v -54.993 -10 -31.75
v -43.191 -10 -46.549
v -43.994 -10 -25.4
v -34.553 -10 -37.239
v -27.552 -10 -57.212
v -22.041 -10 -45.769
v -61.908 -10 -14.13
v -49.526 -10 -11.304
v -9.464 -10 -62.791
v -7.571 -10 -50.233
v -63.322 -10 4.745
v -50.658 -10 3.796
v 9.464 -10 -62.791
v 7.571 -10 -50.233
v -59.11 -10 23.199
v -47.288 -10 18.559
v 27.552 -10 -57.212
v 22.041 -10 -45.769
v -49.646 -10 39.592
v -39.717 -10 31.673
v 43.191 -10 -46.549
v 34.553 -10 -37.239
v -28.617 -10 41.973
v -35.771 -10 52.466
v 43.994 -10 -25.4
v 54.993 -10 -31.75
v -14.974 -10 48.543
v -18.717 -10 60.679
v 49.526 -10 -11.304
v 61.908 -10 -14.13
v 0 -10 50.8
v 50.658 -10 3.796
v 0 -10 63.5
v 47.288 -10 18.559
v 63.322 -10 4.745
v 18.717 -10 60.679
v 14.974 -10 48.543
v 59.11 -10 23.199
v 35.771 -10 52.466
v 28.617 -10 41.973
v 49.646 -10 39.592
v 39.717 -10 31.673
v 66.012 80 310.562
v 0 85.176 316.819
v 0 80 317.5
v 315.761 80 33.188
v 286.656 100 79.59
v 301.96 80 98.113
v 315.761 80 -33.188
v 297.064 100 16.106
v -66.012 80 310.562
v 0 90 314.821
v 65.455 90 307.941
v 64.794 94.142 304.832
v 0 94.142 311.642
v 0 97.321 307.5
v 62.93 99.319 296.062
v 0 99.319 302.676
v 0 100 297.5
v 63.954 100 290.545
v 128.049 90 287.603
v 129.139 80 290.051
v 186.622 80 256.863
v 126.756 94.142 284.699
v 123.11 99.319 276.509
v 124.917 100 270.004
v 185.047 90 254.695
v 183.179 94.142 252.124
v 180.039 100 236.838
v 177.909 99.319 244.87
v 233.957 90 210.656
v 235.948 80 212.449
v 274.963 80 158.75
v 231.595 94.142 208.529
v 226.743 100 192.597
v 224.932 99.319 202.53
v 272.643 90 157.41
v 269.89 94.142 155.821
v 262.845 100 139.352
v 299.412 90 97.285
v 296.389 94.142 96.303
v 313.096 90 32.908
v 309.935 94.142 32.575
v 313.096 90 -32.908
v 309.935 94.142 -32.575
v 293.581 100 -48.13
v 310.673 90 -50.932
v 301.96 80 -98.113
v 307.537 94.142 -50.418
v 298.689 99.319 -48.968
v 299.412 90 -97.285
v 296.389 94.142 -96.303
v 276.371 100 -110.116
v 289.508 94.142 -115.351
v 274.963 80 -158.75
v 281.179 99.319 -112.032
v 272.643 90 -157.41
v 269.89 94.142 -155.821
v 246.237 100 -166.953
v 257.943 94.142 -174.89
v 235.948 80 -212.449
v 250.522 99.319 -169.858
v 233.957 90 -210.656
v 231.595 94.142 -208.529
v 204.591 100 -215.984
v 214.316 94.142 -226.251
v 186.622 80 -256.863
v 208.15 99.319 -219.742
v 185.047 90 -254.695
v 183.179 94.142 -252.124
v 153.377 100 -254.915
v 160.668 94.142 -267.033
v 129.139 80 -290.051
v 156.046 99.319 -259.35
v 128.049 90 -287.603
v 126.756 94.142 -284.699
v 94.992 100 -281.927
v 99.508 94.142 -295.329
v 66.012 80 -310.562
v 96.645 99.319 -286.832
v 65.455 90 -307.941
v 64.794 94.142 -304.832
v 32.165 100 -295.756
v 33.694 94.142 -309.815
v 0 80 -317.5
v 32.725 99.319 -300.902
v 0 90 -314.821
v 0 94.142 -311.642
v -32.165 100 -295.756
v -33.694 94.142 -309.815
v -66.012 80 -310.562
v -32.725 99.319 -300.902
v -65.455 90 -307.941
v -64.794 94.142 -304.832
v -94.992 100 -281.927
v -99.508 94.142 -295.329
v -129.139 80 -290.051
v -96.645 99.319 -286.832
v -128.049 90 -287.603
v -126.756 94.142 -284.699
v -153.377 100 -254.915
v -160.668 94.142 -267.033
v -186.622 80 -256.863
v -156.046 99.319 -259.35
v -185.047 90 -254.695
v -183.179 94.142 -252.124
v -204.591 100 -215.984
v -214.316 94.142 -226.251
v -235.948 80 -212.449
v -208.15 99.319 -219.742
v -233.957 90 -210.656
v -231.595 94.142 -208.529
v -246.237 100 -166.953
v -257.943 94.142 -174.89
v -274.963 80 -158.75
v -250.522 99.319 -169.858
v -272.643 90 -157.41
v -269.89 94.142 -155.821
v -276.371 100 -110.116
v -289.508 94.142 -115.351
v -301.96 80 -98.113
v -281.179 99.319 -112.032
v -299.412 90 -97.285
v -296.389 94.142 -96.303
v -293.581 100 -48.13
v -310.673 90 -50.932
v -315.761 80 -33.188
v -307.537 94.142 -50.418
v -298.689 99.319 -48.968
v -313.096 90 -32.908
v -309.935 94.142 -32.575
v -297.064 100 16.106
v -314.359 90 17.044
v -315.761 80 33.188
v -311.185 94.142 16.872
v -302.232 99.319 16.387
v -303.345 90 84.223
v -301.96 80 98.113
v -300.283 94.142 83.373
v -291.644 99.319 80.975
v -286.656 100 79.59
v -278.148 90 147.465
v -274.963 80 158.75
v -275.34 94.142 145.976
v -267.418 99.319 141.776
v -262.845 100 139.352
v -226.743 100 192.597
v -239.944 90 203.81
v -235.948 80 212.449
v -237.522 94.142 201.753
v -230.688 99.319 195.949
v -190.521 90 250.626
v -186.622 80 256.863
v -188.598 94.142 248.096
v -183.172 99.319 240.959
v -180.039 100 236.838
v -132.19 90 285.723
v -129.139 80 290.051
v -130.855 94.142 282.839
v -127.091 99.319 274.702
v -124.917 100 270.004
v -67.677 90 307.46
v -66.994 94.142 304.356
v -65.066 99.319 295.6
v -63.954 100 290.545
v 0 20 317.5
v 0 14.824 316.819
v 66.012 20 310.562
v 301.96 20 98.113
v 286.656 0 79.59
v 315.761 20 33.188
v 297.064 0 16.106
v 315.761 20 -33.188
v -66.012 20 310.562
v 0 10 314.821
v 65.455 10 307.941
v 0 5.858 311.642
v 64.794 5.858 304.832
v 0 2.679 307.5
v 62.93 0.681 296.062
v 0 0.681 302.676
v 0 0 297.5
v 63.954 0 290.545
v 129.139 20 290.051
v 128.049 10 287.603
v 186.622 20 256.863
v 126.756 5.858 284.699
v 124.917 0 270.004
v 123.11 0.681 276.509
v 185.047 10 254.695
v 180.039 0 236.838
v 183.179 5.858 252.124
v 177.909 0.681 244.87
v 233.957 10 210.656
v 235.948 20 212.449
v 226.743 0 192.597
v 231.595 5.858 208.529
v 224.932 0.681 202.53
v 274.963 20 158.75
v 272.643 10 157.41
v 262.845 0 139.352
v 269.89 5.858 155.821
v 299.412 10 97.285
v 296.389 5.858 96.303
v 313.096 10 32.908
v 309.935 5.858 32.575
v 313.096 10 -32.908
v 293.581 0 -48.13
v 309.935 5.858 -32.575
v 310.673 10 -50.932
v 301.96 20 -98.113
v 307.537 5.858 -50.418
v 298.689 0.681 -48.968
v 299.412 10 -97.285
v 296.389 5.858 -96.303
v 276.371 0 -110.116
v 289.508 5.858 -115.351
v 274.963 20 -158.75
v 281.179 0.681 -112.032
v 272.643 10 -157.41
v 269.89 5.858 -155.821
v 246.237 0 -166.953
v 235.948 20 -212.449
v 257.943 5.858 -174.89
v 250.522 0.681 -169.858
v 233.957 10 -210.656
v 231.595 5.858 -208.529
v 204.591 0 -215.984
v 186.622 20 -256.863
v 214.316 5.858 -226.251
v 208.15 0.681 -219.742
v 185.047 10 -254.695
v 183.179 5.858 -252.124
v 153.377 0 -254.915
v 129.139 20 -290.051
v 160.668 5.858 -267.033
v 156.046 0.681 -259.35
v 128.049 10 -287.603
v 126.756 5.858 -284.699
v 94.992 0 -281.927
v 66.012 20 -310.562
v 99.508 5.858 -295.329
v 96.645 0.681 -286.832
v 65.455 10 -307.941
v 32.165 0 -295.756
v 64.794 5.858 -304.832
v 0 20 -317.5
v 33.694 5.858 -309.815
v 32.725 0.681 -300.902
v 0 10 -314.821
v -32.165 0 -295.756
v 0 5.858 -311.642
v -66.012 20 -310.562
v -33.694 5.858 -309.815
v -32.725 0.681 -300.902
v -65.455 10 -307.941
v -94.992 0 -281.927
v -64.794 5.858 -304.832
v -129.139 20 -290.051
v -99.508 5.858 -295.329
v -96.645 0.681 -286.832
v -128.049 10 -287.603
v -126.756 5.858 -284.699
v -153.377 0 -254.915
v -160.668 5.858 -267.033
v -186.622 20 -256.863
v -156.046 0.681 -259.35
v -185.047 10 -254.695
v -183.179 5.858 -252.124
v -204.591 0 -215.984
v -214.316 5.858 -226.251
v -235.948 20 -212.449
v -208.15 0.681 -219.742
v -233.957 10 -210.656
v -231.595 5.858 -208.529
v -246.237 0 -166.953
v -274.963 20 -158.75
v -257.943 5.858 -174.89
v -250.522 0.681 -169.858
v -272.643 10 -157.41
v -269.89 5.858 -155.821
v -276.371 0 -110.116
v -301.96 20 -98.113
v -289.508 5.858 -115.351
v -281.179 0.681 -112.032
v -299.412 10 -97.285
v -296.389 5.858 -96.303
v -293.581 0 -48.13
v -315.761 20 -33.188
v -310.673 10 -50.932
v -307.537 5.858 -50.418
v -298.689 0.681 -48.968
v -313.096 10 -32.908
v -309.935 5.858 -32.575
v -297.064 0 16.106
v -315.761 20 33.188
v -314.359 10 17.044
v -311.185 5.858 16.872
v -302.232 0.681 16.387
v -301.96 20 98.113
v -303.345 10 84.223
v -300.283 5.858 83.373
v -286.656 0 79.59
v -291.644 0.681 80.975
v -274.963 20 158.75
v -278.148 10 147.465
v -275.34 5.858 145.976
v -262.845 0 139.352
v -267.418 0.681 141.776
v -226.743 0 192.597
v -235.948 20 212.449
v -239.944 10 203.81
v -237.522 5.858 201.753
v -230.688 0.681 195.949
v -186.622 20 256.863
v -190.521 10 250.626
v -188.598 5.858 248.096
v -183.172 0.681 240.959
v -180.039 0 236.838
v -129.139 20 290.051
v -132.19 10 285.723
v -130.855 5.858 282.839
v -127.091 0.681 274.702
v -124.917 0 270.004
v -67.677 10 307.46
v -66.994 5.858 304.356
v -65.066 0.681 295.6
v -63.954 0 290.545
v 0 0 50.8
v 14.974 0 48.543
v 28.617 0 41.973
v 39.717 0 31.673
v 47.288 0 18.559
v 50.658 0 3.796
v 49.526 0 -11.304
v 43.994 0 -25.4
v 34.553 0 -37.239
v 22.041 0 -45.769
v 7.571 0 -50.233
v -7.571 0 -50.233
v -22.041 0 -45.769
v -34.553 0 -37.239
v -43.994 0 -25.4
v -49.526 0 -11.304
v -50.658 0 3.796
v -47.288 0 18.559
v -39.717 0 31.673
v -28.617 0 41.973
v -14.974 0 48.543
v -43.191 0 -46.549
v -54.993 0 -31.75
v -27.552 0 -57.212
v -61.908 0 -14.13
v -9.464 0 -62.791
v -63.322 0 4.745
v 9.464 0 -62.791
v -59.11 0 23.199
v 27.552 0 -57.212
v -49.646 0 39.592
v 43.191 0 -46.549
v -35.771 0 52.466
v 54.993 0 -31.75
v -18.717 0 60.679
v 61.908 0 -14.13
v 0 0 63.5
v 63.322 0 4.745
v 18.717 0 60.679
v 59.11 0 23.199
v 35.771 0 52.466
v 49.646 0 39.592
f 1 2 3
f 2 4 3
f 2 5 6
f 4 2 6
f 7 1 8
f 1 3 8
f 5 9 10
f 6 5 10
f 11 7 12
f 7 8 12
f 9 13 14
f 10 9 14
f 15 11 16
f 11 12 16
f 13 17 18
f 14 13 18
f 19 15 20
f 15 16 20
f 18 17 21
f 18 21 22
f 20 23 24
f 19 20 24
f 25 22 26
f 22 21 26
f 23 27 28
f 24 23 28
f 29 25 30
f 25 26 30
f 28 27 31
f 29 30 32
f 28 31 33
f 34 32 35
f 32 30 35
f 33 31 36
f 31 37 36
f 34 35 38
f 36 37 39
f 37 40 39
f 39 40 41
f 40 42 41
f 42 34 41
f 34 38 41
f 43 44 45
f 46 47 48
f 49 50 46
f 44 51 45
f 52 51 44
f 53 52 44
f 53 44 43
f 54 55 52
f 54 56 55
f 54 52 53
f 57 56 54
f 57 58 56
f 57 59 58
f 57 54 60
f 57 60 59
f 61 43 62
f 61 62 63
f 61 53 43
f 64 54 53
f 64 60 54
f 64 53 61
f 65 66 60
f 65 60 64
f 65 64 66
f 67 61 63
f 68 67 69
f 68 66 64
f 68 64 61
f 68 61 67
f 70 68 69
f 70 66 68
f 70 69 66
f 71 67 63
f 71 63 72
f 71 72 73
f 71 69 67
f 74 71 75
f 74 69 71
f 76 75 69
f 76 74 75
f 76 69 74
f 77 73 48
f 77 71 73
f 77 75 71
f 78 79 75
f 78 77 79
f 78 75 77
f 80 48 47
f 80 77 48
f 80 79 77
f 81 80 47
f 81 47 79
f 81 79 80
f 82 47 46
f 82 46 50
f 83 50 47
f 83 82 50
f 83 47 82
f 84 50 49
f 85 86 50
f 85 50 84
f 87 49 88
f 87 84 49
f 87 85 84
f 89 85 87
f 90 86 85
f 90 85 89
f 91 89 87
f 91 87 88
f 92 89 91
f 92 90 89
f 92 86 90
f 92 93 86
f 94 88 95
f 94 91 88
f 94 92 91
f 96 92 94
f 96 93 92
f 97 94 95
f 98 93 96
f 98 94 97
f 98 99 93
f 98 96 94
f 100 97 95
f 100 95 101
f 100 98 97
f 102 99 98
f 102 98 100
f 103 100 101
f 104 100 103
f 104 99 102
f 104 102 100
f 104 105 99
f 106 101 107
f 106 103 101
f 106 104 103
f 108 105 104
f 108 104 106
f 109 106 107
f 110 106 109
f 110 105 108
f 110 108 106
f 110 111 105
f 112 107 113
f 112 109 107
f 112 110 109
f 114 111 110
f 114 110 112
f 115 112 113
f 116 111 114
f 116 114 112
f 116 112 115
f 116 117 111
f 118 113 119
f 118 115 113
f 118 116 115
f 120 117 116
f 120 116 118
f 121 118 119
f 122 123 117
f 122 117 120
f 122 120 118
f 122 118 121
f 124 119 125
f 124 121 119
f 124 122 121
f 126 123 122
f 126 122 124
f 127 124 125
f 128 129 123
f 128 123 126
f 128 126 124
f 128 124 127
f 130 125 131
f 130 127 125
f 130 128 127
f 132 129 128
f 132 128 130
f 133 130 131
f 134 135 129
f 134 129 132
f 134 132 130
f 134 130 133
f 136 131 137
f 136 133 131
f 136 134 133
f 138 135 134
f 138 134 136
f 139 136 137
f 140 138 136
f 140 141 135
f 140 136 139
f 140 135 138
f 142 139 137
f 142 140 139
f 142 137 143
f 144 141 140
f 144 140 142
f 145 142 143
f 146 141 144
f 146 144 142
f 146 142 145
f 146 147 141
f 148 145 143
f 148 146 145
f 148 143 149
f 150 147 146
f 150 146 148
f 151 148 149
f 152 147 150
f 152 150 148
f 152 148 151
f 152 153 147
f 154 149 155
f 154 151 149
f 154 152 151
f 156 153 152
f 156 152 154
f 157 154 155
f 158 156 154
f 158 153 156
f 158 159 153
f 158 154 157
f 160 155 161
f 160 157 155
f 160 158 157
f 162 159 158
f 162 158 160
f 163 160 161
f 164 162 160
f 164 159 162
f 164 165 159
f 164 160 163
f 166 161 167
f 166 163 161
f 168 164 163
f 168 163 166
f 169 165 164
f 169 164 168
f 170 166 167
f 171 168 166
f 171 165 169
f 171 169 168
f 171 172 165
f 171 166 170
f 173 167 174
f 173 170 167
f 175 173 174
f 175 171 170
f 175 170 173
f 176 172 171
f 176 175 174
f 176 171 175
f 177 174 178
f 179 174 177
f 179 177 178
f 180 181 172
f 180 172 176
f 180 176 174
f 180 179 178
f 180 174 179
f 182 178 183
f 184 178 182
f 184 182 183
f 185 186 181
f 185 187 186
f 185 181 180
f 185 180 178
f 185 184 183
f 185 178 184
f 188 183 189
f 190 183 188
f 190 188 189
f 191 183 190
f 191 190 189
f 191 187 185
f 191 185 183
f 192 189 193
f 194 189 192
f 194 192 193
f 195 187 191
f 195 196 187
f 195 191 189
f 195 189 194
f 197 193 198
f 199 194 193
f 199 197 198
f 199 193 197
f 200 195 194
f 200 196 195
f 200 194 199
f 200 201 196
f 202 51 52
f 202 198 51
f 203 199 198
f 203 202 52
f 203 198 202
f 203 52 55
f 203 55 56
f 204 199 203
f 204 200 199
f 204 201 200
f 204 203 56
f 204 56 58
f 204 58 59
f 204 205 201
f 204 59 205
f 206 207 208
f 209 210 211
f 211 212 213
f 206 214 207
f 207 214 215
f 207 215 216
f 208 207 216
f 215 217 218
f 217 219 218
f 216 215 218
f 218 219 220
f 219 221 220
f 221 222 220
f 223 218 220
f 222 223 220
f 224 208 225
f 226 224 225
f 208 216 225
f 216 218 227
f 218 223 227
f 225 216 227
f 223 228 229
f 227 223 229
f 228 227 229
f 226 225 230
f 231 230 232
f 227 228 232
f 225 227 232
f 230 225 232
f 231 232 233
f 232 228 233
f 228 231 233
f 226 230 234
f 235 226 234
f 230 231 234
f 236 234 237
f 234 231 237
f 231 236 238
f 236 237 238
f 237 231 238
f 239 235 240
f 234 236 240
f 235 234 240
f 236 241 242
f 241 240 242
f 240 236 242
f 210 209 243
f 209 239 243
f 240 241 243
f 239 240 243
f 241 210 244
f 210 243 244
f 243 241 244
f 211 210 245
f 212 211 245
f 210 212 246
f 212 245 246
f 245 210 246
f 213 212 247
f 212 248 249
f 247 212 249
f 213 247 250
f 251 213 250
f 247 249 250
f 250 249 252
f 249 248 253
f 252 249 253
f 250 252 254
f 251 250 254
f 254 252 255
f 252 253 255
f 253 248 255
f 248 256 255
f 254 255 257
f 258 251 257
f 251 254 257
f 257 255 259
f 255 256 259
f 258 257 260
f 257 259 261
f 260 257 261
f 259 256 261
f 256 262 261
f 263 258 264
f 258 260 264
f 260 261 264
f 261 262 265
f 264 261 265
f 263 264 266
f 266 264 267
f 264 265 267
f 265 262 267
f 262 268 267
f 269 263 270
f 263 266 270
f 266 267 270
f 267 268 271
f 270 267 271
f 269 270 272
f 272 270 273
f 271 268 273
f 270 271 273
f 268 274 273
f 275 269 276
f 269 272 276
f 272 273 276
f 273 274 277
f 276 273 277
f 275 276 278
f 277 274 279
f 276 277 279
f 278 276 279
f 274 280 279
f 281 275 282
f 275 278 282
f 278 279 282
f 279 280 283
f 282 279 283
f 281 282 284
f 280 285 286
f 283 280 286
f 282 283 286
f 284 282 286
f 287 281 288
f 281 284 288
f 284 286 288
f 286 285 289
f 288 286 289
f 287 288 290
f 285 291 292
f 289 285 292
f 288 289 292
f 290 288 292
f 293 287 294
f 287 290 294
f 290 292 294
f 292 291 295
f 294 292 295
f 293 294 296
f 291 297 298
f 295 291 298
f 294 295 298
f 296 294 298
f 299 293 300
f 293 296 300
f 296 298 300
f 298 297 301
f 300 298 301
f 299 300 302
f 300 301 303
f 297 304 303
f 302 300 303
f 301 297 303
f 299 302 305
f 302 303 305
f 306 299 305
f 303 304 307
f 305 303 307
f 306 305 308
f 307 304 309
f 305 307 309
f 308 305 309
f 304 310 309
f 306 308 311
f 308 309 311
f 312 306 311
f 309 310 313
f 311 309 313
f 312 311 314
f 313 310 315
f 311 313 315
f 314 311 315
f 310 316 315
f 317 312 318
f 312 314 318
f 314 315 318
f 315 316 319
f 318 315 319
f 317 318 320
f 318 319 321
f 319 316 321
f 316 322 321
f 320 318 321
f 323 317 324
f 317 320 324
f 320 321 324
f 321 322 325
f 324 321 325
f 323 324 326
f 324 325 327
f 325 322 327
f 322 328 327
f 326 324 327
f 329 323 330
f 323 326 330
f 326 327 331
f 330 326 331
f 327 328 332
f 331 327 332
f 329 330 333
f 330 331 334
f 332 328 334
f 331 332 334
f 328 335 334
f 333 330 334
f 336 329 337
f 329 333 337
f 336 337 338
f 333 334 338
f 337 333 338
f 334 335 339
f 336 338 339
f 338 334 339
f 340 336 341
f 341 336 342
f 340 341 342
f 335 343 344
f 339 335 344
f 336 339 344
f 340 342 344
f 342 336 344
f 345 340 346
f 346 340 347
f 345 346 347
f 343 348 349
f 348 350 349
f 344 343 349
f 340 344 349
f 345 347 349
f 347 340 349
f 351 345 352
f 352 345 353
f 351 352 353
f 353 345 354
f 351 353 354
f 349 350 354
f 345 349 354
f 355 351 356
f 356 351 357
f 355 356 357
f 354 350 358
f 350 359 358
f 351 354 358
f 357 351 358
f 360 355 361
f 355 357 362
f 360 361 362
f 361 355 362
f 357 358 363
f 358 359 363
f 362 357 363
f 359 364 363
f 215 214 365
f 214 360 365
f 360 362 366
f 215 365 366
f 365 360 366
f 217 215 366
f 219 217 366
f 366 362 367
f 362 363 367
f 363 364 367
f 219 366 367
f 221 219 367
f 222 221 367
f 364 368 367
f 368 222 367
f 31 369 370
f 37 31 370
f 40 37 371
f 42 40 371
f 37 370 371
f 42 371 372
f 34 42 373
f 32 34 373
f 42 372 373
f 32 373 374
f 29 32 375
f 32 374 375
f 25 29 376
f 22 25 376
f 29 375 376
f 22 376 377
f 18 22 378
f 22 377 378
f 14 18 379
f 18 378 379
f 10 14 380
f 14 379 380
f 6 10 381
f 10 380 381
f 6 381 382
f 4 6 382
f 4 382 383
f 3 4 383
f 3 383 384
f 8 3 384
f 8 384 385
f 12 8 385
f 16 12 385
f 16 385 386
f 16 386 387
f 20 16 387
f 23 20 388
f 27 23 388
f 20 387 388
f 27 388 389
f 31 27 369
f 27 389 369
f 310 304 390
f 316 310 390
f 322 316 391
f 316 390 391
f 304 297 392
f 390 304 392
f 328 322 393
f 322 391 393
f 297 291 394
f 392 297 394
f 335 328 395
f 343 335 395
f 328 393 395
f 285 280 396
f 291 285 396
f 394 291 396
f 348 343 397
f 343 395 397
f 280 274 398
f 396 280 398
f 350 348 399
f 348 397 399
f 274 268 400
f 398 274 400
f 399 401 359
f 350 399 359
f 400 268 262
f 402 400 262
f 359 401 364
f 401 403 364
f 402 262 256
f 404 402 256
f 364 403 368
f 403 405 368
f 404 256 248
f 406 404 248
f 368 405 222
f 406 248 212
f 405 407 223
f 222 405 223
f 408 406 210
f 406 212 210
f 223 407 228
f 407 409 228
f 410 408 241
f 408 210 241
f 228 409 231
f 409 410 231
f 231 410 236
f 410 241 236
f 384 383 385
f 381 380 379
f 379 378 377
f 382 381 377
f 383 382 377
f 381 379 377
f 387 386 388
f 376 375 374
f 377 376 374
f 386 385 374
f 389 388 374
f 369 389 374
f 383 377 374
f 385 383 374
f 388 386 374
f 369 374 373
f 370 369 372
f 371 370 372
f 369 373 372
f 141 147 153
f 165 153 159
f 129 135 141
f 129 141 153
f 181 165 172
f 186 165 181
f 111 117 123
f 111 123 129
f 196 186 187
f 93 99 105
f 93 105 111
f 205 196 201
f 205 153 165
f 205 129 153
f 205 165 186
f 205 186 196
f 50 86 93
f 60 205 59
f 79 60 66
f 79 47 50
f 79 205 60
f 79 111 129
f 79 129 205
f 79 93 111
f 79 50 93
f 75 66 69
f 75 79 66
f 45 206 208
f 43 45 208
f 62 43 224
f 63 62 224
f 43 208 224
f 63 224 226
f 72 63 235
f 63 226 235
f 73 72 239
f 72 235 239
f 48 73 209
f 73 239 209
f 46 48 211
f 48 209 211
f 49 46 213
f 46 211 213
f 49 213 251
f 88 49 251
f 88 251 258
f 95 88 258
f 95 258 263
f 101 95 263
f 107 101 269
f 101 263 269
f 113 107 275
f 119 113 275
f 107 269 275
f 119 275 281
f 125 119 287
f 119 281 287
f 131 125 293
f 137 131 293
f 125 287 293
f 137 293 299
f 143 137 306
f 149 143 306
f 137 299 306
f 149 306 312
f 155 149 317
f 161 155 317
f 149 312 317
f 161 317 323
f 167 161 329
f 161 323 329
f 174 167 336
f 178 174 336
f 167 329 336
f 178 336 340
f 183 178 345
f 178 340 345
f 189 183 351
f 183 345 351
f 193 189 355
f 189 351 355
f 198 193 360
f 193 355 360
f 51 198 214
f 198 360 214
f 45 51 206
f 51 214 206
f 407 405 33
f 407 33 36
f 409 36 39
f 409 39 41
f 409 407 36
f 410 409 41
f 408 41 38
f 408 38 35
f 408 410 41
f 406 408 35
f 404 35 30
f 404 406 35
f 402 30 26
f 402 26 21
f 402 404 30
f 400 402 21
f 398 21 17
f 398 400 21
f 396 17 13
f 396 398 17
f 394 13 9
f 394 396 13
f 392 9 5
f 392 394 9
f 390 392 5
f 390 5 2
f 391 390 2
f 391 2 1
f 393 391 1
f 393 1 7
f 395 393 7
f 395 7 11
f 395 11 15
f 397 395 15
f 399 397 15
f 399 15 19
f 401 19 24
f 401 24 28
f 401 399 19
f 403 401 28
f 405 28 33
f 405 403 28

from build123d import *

# Parameters (mm, degrees)
SKETCH3_R           = 317.5
BOSS_EXTRUDE2_DEPTH = 100
FILLET5_R           = 20
SKETCH4_R           = 63.5
SKETCH4_R_2         = 50.8
BOSS_EXTRUDE3_DEPTH = 10


with BuildPart() as part:
    # Sketch3 → Boss-Extrude2 (new body)
    with BuildSketch(Plane(origin=(0, 0, 0), x_dir=(1, 0, 0), z_dir=(0, 1, 0))):
        with Locations(Location((0, 0, 0), (0, 0, 270))):
            Circle(SKETCH3_R)
    extrude(amount=BOSS_EXTRUDE2_DEPTH)

    # Fillet5
    fillet5_edges = [part.edges().sort_by_distance(p)[0] for p in [
        (0, 0, -317.5),
        (0, 100, -317.5),
    ]]
    fillet(fillet5_edges, radius=FILLET5_R)

    # Sketch4 → Boss-Extrude3 (add)
    with BuildSketch(Plane(origin=(0, 0, 0), x_dir=(1, 0, 0), z_dir=(0, 1, 0))):
        with Locations(Location((0, 0, 0), (0, 0, 270))):
            Circle(SKETCH4_R)
        with Locations(Location((0, 0, 0), (0, 0, 270))):
            Circle(SKETCH4_R_2, mode=Mode.SUBTRACT)
    extrude(amount=-BOSS_EXTRUDE3_DEPTH)


solid = part.part
